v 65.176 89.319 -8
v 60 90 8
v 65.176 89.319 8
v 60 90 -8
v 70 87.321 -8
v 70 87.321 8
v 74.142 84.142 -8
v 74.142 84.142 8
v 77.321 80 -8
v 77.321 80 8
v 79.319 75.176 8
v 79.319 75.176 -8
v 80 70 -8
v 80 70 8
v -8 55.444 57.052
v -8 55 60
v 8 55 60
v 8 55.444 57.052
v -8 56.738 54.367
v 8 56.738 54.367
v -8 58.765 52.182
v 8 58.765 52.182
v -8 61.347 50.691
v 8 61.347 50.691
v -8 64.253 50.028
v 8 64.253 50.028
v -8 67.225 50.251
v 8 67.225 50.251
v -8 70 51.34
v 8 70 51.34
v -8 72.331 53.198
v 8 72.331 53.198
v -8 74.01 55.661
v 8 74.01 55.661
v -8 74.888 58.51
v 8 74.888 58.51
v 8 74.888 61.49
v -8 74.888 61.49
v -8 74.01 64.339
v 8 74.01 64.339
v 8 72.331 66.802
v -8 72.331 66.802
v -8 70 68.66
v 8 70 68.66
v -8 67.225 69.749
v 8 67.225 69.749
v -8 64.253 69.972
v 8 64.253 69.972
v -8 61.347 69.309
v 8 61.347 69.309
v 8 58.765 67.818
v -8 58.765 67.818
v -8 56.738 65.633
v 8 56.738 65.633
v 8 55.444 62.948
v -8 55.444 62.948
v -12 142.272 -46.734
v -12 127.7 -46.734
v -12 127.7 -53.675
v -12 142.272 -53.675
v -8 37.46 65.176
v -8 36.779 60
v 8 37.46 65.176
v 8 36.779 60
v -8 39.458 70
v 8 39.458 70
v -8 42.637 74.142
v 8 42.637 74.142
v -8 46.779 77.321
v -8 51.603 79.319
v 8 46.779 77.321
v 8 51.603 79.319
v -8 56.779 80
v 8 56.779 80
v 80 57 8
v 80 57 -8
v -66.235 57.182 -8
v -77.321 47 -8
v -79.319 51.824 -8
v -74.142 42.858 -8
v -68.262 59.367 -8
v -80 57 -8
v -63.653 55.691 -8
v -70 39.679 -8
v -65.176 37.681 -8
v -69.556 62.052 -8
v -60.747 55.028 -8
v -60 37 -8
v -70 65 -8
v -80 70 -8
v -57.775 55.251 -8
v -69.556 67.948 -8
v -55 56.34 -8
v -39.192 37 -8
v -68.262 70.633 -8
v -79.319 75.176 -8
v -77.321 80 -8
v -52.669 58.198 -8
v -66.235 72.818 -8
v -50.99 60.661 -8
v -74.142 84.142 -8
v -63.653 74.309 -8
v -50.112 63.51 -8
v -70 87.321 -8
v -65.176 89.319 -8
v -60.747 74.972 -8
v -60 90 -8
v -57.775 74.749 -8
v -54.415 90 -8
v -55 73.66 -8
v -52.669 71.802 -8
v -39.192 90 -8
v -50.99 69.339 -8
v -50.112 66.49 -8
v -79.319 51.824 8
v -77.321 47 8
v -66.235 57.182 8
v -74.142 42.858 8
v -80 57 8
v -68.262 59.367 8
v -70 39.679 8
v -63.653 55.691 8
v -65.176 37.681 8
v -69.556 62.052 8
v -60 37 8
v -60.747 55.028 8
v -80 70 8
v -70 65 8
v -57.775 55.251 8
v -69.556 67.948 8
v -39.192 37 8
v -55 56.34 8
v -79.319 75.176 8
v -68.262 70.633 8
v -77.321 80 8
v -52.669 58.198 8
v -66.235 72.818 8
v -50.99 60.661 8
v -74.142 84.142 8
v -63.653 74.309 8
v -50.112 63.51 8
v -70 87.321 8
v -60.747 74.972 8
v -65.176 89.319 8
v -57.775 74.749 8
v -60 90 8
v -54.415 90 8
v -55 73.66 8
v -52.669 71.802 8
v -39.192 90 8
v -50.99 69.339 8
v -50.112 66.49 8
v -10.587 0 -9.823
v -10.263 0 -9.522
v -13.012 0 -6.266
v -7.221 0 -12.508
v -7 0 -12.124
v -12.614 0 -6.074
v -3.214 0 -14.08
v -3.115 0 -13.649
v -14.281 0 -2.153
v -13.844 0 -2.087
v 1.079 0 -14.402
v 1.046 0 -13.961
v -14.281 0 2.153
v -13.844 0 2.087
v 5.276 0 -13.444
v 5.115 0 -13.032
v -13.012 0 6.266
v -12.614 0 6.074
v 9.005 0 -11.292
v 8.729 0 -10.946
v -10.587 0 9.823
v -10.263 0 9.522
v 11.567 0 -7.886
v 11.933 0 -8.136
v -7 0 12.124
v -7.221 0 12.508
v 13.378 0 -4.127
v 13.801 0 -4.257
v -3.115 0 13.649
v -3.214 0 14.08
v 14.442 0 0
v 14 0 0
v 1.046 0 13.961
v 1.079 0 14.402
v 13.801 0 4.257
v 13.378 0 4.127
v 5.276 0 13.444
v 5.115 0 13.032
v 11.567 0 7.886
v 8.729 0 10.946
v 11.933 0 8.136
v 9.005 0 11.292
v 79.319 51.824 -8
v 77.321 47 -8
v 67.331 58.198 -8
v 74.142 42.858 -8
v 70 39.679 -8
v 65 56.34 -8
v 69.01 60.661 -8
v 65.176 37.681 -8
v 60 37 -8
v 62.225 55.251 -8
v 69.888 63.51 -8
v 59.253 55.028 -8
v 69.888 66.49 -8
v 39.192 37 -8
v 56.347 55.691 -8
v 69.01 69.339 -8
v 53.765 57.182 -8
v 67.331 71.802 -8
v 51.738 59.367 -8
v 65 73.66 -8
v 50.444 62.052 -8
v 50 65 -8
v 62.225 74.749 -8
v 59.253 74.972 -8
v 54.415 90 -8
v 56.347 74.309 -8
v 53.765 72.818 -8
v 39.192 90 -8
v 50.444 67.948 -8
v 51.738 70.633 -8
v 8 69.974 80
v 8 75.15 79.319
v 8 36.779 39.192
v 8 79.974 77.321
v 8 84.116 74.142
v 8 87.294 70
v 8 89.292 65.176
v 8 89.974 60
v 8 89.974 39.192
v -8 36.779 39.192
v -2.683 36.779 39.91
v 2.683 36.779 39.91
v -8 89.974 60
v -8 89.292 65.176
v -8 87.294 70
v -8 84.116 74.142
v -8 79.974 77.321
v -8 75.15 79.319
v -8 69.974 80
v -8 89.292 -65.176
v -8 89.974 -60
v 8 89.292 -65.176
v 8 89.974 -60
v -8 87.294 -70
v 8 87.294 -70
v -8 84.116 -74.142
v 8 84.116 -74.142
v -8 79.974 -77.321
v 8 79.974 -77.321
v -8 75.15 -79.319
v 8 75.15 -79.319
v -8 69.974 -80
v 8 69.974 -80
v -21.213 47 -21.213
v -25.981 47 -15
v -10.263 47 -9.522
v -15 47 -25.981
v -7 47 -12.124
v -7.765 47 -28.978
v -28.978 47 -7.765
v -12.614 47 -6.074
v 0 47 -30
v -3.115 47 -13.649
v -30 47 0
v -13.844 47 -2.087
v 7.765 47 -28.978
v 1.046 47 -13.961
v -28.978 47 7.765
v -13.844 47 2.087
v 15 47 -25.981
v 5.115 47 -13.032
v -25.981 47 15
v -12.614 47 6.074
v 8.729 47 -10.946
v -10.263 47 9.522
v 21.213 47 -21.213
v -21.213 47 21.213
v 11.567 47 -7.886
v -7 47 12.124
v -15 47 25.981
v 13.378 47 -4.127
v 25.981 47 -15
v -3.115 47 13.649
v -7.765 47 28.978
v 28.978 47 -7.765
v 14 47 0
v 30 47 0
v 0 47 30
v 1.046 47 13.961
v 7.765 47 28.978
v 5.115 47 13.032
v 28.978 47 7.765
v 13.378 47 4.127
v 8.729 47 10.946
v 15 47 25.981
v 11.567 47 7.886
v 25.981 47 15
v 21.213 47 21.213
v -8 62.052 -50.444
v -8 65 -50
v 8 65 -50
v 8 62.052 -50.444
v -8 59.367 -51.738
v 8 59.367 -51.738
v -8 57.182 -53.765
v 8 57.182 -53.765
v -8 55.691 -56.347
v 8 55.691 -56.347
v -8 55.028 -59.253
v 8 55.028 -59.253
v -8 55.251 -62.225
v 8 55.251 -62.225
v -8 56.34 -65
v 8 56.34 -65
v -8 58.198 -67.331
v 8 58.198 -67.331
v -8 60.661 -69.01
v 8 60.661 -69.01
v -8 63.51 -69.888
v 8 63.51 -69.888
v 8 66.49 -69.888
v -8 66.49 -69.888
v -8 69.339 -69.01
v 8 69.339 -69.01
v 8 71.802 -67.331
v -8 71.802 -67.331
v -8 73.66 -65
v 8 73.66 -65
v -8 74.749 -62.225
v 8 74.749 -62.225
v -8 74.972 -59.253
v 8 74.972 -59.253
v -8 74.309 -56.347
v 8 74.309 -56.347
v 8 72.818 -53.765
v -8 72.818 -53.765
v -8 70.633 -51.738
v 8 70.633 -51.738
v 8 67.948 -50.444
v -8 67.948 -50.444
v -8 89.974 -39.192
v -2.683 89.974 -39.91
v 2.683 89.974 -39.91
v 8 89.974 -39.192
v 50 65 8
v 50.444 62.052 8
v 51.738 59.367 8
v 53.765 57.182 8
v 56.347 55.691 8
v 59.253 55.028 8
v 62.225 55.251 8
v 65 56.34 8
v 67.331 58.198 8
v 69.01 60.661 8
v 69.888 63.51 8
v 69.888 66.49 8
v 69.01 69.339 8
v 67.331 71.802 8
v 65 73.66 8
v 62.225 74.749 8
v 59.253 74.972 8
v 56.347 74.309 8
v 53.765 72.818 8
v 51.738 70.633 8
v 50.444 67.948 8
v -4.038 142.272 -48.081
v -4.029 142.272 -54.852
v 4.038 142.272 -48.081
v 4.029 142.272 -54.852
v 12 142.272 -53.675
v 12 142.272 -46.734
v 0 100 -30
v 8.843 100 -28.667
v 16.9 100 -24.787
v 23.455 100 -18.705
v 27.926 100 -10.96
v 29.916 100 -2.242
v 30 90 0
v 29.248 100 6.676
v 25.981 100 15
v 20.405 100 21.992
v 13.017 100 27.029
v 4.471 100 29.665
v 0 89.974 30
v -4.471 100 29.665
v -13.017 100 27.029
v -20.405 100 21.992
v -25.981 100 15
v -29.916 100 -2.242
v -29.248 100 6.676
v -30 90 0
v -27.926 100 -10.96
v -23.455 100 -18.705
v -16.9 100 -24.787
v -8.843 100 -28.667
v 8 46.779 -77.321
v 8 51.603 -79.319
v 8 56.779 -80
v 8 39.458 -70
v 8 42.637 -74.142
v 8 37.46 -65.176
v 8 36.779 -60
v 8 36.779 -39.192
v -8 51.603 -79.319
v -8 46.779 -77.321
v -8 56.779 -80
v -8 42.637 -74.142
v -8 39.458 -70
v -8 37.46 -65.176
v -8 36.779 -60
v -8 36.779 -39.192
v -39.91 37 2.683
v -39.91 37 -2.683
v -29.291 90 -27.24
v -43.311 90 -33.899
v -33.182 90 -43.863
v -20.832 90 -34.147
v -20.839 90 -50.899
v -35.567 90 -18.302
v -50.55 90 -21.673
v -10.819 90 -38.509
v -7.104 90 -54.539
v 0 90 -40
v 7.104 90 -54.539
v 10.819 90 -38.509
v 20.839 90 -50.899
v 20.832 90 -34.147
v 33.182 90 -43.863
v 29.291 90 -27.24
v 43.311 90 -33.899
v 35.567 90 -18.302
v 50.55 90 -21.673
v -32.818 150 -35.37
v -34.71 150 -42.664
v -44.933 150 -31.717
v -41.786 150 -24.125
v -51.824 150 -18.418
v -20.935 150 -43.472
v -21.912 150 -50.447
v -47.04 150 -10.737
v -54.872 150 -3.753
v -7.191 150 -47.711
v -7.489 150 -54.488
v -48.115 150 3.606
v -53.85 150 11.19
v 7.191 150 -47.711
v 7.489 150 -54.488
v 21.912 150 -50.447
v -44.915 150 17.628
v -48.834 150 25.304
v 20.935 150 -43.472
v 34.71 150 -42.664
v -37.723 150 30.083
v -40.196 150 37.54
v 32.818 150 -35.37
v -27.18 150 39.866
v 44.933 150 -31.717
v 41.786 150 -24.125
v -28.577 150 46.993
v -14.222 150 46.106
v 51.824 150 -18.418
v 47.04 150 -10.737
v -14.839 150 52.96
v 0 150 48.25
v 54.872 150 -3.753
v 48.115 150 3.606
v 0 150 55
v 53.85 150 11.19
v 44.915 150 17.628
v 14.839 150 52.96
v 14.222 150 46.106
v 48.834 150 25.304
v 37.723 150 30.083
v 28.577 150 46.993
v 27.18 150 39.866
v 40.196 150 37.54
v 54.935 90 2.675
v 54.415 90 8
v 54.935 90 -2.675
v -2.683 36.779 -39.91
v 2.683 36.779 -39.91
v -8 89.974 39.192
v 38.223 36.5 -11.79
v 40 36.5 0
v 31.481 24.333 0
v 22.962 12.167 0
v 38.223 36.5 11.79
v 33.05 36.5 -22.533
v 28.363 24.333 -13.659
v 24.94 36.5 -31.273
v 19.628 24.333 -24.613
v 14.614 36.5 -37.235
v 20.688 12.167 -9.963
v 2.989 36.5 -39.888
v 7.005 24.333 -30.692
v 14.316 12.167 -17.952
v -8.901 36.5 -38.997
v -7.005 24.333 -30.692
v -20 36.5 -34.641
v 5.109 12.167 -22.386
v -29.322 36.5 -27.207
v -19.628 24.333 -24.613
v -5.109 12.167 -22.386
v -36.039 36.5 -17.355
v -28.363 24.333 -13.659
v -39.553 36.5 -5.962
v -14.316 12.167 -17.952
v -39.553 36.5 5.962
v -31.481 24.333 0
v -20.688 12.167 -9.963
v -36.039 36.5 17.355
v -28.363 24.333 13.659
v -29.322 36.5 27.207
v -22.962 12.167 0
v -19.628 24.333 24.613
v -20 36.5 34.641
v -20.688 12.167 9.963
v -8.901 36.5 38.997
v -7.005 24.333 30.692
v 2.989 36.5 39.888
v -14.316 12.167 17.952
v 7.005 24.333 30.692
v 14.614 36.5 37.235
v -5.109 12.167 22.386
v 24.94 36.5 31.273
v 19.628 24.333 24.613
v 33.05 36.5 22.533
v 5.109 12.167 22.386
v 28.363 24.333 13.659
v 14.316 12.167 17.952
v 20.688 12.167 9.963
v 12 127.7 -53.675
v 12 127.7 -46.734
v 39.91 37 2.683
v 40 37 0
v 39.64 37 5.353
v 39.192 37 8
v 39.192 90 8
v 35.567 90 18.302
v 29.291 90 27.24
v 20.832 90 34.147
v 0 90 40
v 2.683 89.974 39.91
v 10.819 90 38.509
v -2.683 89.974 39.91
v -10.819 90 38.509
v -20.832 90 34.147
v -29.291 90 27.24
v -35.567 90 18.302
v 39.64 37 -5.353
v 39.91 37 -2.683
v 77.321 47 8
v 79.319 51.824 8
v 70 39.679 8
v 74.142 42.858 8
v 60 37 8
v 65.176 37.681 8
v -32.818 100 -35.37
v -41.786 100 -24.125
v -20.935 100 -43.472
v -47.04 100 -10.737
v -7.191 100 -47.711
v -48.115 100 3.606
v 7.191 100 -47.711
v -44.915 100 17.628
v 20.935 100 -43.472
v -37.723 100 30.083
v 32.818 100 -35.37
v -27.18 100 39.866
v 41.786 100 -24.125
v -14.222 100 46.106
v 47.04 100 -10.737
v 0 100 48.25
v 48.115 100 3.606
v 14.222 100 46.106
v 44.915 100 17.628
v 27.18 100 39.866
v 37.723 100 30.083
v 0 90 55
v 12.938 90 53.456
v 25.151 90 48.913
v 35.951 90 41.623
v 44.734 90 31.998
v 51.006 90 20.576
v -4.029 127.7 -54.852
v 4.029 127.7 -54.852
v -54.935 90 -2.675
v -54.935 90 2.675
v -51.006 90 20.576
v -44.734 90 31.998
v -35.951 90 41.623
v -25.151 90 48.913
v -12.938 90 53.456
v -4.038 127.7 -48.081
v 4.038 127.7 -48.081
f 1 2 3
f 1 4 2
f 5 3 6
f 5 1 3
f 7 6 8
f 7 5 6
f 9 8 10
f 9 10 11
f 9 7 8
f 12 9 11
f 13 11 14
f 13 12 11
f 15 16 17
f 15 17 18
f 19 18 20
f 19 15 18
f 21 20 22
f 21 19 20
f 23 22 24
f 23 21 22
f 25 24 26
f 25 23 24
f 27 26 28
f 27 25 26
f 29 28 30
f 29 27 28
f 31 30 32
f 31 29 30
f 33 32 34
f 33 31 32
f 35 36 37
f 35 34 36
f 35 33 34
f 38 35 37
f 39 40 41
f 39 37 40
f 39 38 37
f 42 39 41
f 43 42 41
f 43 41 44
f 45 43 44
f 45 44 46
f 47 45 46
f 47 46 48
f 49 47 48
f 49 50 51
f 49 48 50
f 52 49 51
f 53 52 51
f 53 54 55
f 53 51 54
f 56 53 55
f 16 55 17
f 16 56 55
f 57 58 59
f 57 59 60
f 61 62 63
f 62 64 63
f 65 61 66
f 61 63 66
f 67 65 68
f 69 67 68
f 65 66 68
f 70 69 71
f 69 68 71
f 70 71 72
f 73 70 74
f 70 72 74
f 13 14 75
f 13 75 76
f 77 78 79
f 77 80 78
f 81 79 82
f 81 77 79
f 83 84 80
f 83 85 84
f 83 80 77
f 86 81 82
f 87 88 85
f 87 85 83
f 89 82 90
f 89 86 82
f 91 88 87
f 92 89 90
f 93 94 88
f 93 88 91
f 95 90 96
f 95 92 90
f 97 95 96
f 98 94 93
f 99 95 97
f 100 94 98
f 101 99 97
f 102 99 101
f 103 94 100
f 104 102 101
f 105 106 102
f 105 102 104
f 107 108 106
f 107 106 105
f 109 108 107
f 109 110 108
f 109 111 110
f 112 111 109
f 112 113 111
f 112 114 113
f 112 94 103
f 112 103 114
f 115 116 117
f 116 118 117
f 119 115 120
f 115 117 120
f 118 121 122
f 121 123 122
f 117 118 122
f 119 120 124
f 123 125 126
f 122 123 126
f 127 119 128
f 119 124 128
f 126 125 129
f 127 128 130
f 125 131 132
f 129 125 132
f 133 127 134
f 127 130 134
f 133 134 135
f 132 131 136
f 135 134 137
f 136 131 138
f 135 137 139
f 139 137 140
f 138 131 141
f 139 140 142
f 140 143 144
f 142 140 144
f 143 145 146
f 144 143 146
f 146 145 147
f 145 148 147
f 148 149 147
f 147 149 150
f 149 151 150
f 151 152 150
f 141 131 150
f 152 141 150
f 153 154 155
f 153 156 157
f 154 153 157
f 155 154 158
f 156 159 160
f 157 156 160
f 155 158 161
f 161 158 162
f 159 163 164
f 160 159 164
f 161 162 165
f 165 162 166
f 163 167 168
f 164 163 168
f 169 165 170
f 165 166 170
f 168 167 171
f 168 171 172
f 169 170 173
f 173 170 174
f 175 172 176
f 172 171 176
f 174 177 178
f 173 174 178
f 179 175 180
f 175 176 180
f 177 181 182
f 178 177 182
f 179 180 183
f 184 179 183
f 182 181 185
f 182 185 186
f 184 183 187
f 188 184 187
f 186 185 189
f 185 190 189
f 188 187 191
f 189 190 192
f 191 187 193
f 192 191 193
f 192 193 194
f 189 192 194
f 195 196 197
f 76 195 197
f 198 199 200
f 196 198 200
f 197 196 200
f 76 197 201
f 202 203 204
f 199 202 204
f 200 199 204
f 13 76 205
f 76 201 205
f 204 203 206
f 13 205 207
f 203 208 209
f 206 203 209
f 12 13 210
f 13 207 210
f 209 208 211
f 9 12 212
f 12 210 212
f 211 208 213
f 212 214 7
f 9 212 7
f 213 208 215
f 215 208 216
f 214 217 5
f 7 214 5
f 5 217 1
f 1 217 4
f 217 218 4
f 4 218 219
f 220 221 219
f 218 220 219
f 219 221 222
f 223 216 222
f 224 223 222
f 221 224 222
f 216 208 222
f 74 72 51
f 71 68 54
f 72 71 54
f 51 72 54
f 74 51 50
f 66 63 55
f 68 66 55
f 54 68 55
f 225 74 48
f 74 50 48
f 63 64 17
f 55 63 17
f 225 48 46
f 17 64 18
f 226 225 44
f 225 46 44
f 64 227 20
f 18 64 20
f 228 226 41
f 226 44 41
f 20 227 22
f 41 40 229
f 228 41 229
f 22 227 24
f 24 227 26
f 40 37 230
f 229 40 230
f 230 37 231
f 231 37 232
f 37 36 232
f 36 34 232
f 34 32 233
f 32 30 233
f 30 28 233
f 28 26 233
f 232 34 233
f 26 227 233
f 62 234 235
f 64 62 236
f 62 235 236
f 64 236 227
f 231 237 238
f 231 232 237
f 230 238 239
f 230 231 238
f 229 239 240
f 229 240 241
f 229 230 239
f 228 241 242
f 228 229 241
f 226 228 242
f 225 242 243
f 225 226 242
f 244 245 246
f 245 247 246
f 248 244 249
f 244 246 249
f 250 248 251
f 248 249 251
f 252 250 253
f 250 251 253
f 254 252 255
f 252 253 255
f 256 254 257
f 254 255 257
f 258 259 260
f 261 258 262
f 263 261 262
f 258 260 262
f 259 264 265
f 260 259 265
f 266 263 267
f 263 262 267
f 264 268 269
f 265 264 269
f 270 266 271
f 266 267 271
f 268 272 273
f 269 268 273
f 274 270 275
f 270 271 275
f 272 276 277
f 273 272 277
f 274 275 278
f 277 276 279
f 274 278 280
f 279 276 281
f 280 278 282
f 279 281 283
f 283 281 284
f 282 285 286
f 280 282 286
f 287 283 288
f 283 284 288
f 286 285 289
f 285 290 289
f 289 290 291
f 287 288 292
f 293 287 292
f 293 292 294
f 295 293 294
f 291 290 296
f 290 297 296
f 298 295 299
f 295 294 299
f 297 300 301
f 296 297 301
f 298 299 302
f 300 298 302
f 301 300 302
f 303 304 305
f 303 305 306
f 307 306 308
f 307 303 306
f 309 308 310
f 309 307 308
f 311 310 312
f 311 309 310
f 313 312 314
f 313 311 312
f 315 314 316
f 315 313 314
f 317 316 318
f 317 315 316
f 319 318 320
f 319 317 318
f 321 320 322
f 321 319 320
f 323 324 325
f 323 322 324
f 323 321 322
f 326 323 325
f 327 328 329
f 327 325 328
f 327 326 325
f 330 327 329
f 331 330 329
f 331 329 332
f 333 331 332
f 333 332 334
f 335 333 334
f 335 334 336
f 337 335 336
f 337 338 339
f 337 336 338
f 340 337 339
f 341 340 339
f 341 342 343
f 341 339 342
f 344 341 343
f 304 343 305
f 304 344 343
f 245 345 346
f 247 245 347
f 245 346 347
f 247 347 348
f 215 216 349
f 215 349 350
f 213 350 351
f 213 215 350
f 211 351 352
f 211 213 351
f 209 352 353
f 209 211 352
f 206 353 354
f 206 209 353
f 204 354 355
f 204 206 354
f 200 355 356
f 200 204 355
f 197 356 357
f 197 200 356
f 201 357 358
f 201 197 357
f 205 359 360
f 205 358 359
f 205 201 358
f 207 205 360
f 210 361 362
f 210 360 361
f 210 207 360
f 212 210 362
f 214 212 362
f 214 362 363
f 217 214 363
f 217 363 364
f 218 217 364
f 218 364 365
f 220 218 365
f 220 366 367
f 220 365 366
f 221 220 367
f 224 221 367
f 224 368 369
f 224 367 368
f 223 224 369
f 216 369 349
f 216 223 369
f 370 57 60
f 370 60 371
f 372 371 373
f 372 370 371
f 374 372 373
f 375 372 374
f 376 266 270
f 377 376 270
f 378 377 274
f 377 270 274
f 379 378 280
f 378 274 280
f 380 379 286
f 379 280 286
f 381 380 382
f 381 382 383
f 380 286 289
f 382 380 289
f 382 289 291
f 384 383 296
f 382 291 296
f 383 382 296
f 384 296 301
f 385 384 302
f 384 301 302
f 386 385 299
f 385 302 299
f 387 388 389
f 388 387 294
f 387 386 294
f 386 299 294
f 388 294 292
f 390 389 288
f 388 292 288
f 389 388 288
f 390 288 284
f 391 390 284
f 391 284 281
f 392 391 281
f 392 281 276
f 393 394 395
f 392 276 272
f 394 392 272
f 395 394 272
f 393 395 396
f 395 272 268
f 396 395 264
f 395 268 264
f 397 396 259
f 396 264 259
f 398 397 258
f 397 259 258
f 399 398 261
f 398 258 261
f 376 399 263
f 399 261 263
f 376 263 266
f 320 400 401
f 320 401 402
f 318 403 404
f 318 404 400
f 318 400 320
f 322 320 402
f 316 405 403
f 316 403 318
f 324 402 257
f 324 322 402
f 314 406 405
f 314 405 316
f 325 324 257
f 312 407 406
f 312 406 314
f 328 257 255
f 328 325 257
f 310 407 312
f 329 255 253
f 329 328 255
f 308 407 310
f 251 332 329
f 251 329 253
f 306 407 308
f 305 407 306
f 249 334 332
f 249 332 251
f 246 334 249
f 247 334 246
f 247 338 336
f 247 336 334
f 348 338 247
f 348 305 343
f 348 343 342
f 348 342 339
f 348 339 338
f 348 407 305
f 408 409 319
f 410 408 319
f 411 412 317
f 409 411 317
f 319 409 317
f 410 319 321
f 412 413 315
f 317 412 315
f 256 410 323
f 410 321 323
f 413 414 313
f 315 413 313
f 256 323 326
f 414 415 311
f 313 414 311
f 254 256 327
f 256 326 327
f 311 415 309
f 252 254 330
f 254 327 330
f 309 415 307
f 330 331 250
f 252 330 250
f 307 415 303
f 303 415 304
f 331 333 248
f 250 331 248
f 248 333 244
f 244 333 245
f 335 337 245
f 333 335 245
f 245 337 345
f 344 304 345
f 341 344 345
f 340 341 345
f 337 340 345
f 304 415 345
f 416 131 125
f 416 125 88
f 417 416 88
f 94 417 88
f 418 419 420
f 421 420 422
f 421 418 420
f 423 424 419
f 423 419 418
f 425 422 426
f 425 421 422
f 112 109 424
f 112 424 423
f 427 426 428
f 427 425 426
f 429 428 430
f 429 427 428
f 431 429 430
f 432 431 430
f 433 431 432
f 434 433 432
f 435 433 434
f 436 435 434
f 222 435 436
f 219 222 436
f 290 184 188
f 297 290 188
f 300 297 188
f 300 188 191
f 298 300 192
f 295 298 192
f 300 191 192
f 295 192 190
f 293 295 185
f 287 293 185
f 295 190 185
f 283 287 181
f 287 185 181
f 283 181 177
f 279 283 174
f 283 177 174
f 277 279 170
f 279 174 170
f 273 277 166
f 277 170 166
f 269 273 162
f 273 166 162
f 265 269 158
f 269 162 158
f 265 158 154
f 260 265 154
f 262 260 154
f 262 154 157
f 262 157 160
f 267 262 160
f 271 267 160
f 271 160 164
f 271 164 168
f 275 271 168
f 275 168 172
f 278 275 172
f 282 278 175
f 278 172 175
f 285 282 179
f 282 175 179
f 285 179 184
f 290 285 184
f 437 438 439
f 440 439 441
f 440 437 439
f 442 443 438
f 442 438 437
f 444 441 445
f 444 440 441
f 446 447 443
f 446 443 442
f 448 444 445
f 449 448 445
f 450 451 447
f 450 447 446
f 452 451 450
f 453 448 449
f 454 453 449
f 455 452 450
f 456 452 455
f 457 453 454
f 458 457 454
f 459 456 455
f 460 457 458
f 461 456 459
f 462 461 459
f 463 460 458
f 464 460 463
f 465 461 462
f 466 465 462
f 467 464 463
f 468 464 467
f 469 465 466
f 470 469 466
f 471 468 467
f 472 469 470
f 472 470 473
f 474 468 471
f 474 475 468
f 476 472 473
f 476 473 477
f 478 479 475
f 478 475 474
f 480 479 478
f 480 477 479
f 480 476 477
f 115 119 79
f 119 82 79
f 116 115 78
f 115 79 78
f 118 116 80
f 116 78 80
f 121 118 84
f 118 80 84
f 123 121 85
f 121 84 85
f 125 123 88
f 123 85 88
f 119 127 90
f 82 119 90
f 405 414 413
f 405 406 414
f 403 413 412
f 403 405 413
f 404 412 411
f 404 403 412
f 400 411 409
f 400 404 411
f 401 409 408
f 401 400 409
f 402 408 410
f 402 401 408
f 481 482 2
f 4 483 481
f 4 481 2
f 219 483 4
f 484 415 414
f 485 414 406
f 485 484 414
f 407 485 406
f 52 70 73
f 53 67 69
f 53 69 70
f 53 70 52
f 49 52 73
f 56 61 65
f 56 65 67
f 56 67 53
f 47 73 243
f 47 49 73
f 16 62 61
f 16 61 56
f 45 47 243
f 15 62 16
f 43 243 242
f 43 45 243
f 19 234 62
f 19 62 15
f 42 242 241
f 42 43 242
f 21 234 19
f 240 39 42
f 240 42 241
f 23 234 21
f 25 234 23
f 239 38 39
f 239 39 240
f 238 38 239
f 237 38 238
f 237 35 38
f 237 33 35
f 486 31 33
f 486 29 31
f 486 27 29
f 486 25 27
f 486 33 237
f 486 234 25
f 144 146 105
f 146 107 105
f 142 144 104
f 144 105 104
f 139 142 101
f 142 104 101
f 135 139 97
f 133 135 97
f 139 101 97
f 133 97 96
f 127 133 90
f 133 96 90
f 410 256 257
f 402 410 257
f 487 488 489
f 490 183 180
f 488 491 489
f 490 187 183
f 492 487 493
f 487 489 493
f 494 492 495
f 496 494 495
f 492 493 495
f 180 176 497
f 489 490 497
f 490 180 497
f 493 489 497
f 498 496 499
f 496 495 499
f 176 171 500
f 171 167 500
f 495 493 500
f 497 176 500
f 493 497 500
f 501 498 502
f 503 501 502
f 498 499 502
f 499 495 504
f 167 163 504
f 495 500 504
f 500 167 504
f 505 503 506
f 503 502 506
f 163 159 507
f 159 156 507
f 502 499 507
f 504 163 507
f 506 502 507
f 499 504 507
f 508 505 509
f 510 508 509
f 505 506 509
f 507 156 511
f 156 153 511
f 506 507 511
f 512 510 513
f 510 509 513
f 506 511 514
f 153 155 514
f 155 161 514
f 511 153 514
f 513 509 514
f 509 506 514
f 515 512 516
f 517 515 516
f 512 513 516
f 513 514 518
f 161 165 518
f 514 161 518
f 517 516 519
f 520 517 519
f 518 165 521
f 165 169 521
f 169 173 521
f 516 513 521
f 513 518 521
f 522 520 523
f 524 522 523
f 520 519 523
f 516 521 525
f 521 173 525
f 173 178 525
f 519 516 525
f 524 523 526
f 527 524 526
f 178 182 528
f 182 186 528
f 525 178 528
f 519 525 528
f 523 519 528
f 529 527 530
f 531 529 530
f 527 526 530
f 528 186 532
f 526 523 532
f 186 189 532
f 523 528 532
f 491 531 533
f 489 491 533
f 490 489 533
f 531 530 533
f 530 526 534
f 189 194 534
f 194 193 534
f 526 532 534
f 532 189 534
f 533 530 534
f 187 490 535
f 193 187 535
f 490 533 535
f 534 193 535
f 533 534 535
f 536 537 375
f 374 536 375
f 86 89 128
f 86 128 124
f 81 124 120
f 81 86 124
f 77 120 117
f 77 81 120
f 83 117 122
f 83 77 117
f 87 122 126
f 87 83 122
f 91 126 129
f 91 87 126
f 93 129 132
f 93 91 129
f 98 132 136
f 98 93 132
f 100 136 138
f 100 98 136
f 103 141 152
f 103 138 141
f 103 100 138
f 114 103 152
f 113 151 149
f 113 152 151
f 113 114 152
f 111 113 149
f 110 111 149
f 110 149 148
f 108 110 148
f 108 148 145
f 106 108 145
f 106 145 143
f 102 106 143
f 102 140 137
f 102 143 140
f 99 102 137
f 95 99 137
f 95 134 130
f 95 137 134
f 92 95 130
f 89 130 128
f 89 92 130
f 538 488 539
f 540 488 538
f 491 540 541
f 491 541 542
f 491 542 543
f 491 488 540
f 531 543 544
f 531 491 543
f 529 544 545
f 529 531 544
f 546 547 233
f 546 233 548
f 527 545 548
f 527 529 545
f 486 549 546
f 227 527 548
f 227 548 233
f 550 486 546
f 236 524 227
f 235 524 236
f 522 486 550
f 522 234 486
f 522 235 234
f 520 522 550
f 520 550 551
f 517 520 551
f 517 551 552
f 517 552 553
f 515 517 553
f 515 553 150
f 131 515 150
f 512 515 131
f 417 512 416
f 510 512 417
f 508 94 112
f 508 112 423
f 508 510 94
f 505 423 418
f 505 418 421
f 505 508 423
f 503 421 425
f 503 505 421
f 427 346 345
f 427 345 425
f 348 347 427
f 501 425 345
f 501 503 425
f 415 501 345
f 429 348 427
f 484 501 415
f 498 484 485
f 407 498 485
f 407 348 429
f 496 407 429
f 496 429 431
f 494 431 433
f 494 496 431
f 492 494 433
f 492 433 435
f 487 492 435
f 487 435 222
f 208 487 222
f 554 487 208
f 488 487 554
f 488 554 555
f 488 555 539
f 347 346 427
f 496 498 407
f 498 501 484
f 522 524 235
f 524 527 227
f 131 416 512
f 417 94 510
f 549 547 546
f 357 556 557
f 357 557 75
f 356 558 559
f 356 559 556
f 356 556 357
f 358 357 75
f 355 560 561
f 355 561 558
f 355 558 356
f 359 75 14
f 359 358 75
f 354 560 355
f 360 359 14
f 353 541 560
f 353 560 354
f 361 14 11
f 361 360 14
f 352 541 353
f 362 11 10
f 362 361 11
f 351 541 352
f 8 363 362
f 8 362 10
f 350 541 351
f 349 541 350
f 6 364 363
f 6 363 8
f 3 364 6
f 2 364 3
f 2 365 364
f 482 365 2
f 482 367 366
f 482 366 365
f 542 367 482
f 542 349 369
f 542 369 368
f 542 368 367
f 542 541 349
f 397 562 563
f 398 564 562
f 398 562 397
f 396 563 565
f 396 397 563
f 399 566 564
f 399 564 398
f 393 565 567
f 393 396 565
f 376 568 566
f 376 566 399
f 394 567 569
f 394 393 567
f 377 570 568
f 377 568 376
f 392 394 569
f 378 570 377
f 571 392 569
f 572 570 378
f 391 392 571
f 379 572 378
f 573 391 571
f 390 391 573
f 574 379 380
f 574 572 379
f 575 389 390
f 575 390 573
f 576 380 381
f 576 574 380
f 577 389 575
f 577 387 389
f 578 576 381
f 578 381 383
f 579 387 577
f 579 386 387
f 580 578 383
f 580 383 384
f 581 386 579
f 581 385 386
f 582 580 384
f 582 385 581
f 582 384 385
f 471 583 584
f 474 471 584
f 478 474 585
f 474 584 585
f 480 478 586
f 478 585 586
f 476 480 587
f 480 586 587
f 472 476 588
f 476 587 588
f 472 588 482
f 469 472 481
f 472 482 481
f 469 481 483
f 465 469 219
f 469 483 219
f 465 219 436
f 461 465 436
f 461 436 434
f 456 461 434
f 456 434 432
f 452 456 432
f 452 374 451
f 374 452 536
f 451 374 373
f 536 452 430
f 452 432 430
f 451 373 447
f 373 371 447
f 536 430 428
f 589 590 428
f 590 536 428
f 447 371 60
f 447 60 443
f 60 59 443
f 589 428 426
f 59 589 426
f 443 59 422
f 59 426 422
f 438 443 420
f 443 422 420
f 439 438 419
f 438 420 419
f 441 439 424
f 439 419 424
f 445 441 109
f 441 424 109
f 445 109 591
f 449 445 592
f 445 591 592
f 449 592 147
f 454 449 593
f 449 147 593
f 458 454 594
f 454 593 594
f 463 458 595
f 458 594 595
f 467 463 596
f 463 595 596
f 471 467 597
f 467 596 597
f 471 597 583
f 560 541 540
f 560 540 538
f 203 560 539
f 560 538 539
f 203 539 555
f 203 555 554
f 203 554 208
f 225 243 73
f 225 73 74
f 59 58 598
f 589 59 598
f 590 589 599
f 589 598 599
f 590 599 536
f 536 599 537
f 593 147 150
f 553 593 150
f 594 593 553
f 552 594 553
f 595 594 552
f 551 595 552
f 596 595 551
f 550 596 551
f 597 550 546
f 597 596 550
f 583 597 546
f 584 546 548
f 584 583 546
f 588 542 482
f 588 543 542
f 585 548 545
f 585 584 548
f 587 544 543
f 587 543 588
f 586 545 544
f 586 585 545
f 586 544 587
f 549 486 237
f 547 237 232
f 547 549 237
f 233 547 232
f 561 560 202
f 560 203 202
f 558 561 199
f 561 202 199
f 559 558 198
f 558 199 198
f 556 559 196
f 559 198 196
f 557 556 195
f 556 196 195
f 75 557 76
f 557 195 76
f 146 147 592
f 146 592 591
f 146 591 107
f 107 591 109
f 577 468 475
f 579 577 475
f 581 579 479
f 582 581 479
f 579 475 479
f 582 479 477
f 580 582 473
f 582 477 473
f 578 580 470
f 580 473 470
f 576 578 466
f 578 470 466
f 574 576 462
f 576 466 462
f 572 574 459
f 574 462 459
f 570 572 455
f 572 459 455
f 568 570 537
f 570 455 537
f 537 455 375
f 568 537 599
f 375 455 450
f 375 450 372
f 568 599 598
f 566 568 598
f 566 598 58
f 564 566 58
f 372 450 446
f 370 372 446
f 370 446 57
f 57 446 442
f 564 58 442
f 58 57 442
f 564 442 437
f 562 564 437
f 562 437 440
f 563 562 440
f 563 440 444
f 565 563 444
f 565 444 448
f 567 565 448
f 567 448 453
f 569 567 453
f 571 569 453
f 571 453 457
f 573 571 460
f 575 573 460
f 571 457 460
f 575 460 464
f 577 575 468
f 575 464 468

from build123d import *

# Parameters (mm, degrees)
SKETCH_1_R               = 55
EXTRUDE_1_DEPTH          = 150
SKETCH_2_R               = 30
CUT_EXTRUDE_1_DEPTH      = 100
SKETCH_3_R               = 48.25
CUT_EXTRUDE_2_DEPTH      = 50
SKETCH_4_R               = 60
SKETCH_4_R_2             = 40
CUT_EXTRUDE_1_2_DEPTH    = 90
EXTRUDE_START            = 30
SKETCH_6_W               = 16
SKETCH_6_H               = 53.194792051
EXTRUDE_3_DEPTH          = 50
EXTRUDE_START_2          = -30
SKETCH_10_W              = 16
SKETCH_10_H              = 53.194792051
EXTRUDE_4_DEPTH          = 50
SKETCH_11_W              = 16
SKETCH_11_H              = 53
EXTRUDE_6_DEPTH          = 50
SKETCH_12_W              = 16
SKETCH_12_H              = 53
EXTRUDE_7_DEPTH          = 50
FILLET_1_R               = 20
FILLET_2_R               = 20
FILLET_3_R               = 20
FILLET_4_R               = 20
CUT_EXTRUDE_4_DEPTH      = 40
CUT_EXTRUDE_4_DEPTH_BACK = 40
SKETCH_15_R              = 10
CUT_EXTRUDE_5_DEPTH      = 40
CUT_EXTRUDE_5_DEPTH_BACK = 40
SKETCH_16_R              = 10
SKETCH_17_W              = 24
SKETCH_17_H              = 14.571737585
CUT_EXTRUDE_6_DEPTH      = 87
SKETCH_18_R              = 34
SKETCH_18_R_2            = 14
EXTRUDE_1_2_DEPTH        = 47


with BuildPart() as part:
    # 草图1 → Extrude 1 (new body)
    with BuildSketch(Plane(origin=(0, 0, 0), x_dir=(1, 0, 0), z_dir=(0, 1, 0))):
        with Locations(Location((0, 0, 0), (0, 0, 270))):
            Circle(SKETCH_1_R)
    extrude(amount=EXTRUDE_1_DEPTH)

    # 草图2 → Cut-Extrude 1 (cut)
    with BuildSketch(Plane.XZ):
        with Locations(Location((0, 0, 0), (0, 0, 270))):
            Circle(SKETCH_2_R)
    extrude(amount=-CUT_EXTRUDE_1_DEPTH, mode=Mode.SUBTRACT)

    # 草图3 → 切除-拉伸2 (cut)
    with BuildSketch(Plane(origin=(0, 150, 0), x_dir=(1, 0, 0), z_dir=(0, 1, 0))):
        with Locations(Location((0, 0, 0), (0, 0, 270))):
            Circle(SKETCH_3_R)
    extrude(amount=-CUT_EXTRUDE_2_DEPTH, mode=Mode.SUBTRACT)

    # 草图4 → Cut-Extrude 1 2 (cut)
    with BuildSketch(Plane.XZ):
        Circle(SKETCH_4_R)
        Circle(SKETCH_4_R_2, mode=Mode.SUBTRACT)
    extrude(amount=-CUT_EXTRUDE_1_2_DEPTH, mode=Mode.SUBTRACT)

    # 草图11 → 凸台-拉伸6 (add)
    with BuildSketch(Plane(origin=(0, 0, 0), x_dir=(0, 0, -1), z_dir=(1, 0, 0)).offset(EXTRUDE_START)):
        with Locations((0, 63.5)):
            Rectangle(SKETCH_11_W, SKETCH_11_H)
    extrude(amount=EXTRUDE_6_DEPTH)

    # 草图12 → 凸台-拉伸7 (add)
    with BuildSketch(Plane(origin=(0, 0, 0), x_dir=(0, 0, -1), z_dir=(1, 0, 0)).offset(EXTRUDE_START_2)):
        with Locations((0, 63.5)):
            Rectangle(SKETCH_12_W, SKETCH_12_H)
    extrude(amount=-EXTRUDE_7_DEPTH)

    # 圆角1
    fillet_1_edges = [part.edges().sort_by_distance(p)[0] for p in [
        (-80, 90, 0),
        (-80, 37, 0),
    ]]
    fillet(fillet_1_edges, radius=FILLET_1_R)

    # 圆角3
    fillet_3_edges = [part.edges().sort_by_distance(p)[0] for p in [
        (80, 37, 0),
        (80, 90, 0),
    ]]
    fillet(fillet_3_edges, radius=FILLET_3_R)

    # 草图15 → 切除-拉伸4 (cut, two sides: drawn at the far end of the back side and taken through both)
    with BuildSketch(Plane.XY.offset(-CUT_EXTRUDE_4_DEPTH_BACK)):
        with Locations(Location((60, 65, 0), (0, 0, 180))):
            Circle(SKETCH_15_R)
        with Locations(Location((-60, 65, 0), (0, 0, 180))):
            Circle(SKETCH_15_R)
    extrude(amount=CUT_EXTRUDE_4_DEPTH + CUT_EXTRUDE_4_DEPTH_BACK, mode=Mode.SUBTRACT)

    # 草图17 → 切除-拉伸6 (cut)
    with BuildSketch(Plane.XY):
        with Locations((0, 134.985868793)):
            Rectangle(SKETCH_17_W, SKETCH_17_H)
    extrude(amount=-CUT_EXTRUDE_6_DEPTH, mode=Mode.SUBTRACT)



with BuildPart() as body_2:
    # 草图6 → 凸台-拉伸3 (new body)
    with BuildSketch(Plane.XY.offset(EXTRUDE_START)):
        with Locations((0, 63.37627806)):
            Rectangle(SKETCH_6_W, SKETCH_6_H)
    extrude(amount=EXTRUDE_3_DEPTH)

    # 圆角4
    fillet_4_edges = [body_2.edges().sort_by_distance(p)[0] for p in [
        (0, 36.778882035, 80),
        (0, 89.973674086, 80),
    ]]
    fillet(fillet_4_edges, radius=FILLET_4_R)


with BuildPart() as body_3:
    # 草图10 → 凸台-拉伸4 (new body)
    with BuildSketch(Plane.XY.offset(EXTRUDE_START_2)):
        with Locations((0, 63.37627806)):
            Rectangle(SKETCH_10_W, SKETCH_10_H)
    extrude(amount=-EXTRUDE_4_DEPTH)

    # 圆角2
    fillet_2_edges = [body_3.edges().sort_by_distance(p)[0] for p in [
        (0, 89.973674086, -80),
        (0, 36.778882035, -80),
    ]]
    fillet(fillet_2_edges, radius=FILLET_2_R)


with BuildPart() as cut_extrude_5_tool:
    # 草图16 → 切除-拉伸5 (new, two sides: drawn at the far end of the back side and taken through both)
    with BuildSketch(Plane(origin=(0, 0, 0), x_dir=(0, 0, -1), z_dir=(1, 0, 0)).offset(-CUT_EXTRUDE_5_DEPTH_BACK)):
        with Locations(Location((60, 65, 0), (0, 0, 180))):
            Circle(SKETCH_16_R)
        with Locations(Location((-60, 65, 0), (0, 0, 270))):
            Circle(SKETCH_16_R)
    extrude(amount=CUT_EXTRUDE_5_DEPTH + CUT_EXTRUDE_5_DEPTH_BACK)


with BuildPart() as body_2_1:
    add(body_2.part)

    # 切除-拉伸5: cut by cut_extrude_5_tool
    add(cut_extrude_5_tool.part, mode=Mode.SUBTRACT)


with BuildPart() as body_3_1:
    add(body_3.part)

    # 切除-拉伸5: cut by cut_extrude_5_tool
    add(cut_extrude_5_tool.part, mode=Mode.SUBTRACT)


with BuildPart() as part_1:
    add(part.part)

    add(body_2_1.part)  # Extrude 1 2 merges body 2

    add(body_3_1.part)  # Extrude 1 2 merges body 3
    # 草图18 → Extrude 1 2 (add)
    with BuildSketch(Plane.XZ):
        Circle(SKETCH_18_R)
        Circle(SKETCH_18_R_2, mode=Mode.SUBTRACT)
    extrude(amount=-EXTRUDE_1_2_DEPTH)

    # 倒角1: read off the stored shape, not the designer's step
    # 倒角1 outline → 倒角1 (revolve, cut)
    with BuildSketch(Plane.XY):
        Polygon((40, 36.5), (14.442424855, 0), (40, 0), align=None)
    revolve(axis=Axis((0, 0, 0), (0, 1, 0)), mode=Mode.SUBTRACT)


solid = part_1.part
